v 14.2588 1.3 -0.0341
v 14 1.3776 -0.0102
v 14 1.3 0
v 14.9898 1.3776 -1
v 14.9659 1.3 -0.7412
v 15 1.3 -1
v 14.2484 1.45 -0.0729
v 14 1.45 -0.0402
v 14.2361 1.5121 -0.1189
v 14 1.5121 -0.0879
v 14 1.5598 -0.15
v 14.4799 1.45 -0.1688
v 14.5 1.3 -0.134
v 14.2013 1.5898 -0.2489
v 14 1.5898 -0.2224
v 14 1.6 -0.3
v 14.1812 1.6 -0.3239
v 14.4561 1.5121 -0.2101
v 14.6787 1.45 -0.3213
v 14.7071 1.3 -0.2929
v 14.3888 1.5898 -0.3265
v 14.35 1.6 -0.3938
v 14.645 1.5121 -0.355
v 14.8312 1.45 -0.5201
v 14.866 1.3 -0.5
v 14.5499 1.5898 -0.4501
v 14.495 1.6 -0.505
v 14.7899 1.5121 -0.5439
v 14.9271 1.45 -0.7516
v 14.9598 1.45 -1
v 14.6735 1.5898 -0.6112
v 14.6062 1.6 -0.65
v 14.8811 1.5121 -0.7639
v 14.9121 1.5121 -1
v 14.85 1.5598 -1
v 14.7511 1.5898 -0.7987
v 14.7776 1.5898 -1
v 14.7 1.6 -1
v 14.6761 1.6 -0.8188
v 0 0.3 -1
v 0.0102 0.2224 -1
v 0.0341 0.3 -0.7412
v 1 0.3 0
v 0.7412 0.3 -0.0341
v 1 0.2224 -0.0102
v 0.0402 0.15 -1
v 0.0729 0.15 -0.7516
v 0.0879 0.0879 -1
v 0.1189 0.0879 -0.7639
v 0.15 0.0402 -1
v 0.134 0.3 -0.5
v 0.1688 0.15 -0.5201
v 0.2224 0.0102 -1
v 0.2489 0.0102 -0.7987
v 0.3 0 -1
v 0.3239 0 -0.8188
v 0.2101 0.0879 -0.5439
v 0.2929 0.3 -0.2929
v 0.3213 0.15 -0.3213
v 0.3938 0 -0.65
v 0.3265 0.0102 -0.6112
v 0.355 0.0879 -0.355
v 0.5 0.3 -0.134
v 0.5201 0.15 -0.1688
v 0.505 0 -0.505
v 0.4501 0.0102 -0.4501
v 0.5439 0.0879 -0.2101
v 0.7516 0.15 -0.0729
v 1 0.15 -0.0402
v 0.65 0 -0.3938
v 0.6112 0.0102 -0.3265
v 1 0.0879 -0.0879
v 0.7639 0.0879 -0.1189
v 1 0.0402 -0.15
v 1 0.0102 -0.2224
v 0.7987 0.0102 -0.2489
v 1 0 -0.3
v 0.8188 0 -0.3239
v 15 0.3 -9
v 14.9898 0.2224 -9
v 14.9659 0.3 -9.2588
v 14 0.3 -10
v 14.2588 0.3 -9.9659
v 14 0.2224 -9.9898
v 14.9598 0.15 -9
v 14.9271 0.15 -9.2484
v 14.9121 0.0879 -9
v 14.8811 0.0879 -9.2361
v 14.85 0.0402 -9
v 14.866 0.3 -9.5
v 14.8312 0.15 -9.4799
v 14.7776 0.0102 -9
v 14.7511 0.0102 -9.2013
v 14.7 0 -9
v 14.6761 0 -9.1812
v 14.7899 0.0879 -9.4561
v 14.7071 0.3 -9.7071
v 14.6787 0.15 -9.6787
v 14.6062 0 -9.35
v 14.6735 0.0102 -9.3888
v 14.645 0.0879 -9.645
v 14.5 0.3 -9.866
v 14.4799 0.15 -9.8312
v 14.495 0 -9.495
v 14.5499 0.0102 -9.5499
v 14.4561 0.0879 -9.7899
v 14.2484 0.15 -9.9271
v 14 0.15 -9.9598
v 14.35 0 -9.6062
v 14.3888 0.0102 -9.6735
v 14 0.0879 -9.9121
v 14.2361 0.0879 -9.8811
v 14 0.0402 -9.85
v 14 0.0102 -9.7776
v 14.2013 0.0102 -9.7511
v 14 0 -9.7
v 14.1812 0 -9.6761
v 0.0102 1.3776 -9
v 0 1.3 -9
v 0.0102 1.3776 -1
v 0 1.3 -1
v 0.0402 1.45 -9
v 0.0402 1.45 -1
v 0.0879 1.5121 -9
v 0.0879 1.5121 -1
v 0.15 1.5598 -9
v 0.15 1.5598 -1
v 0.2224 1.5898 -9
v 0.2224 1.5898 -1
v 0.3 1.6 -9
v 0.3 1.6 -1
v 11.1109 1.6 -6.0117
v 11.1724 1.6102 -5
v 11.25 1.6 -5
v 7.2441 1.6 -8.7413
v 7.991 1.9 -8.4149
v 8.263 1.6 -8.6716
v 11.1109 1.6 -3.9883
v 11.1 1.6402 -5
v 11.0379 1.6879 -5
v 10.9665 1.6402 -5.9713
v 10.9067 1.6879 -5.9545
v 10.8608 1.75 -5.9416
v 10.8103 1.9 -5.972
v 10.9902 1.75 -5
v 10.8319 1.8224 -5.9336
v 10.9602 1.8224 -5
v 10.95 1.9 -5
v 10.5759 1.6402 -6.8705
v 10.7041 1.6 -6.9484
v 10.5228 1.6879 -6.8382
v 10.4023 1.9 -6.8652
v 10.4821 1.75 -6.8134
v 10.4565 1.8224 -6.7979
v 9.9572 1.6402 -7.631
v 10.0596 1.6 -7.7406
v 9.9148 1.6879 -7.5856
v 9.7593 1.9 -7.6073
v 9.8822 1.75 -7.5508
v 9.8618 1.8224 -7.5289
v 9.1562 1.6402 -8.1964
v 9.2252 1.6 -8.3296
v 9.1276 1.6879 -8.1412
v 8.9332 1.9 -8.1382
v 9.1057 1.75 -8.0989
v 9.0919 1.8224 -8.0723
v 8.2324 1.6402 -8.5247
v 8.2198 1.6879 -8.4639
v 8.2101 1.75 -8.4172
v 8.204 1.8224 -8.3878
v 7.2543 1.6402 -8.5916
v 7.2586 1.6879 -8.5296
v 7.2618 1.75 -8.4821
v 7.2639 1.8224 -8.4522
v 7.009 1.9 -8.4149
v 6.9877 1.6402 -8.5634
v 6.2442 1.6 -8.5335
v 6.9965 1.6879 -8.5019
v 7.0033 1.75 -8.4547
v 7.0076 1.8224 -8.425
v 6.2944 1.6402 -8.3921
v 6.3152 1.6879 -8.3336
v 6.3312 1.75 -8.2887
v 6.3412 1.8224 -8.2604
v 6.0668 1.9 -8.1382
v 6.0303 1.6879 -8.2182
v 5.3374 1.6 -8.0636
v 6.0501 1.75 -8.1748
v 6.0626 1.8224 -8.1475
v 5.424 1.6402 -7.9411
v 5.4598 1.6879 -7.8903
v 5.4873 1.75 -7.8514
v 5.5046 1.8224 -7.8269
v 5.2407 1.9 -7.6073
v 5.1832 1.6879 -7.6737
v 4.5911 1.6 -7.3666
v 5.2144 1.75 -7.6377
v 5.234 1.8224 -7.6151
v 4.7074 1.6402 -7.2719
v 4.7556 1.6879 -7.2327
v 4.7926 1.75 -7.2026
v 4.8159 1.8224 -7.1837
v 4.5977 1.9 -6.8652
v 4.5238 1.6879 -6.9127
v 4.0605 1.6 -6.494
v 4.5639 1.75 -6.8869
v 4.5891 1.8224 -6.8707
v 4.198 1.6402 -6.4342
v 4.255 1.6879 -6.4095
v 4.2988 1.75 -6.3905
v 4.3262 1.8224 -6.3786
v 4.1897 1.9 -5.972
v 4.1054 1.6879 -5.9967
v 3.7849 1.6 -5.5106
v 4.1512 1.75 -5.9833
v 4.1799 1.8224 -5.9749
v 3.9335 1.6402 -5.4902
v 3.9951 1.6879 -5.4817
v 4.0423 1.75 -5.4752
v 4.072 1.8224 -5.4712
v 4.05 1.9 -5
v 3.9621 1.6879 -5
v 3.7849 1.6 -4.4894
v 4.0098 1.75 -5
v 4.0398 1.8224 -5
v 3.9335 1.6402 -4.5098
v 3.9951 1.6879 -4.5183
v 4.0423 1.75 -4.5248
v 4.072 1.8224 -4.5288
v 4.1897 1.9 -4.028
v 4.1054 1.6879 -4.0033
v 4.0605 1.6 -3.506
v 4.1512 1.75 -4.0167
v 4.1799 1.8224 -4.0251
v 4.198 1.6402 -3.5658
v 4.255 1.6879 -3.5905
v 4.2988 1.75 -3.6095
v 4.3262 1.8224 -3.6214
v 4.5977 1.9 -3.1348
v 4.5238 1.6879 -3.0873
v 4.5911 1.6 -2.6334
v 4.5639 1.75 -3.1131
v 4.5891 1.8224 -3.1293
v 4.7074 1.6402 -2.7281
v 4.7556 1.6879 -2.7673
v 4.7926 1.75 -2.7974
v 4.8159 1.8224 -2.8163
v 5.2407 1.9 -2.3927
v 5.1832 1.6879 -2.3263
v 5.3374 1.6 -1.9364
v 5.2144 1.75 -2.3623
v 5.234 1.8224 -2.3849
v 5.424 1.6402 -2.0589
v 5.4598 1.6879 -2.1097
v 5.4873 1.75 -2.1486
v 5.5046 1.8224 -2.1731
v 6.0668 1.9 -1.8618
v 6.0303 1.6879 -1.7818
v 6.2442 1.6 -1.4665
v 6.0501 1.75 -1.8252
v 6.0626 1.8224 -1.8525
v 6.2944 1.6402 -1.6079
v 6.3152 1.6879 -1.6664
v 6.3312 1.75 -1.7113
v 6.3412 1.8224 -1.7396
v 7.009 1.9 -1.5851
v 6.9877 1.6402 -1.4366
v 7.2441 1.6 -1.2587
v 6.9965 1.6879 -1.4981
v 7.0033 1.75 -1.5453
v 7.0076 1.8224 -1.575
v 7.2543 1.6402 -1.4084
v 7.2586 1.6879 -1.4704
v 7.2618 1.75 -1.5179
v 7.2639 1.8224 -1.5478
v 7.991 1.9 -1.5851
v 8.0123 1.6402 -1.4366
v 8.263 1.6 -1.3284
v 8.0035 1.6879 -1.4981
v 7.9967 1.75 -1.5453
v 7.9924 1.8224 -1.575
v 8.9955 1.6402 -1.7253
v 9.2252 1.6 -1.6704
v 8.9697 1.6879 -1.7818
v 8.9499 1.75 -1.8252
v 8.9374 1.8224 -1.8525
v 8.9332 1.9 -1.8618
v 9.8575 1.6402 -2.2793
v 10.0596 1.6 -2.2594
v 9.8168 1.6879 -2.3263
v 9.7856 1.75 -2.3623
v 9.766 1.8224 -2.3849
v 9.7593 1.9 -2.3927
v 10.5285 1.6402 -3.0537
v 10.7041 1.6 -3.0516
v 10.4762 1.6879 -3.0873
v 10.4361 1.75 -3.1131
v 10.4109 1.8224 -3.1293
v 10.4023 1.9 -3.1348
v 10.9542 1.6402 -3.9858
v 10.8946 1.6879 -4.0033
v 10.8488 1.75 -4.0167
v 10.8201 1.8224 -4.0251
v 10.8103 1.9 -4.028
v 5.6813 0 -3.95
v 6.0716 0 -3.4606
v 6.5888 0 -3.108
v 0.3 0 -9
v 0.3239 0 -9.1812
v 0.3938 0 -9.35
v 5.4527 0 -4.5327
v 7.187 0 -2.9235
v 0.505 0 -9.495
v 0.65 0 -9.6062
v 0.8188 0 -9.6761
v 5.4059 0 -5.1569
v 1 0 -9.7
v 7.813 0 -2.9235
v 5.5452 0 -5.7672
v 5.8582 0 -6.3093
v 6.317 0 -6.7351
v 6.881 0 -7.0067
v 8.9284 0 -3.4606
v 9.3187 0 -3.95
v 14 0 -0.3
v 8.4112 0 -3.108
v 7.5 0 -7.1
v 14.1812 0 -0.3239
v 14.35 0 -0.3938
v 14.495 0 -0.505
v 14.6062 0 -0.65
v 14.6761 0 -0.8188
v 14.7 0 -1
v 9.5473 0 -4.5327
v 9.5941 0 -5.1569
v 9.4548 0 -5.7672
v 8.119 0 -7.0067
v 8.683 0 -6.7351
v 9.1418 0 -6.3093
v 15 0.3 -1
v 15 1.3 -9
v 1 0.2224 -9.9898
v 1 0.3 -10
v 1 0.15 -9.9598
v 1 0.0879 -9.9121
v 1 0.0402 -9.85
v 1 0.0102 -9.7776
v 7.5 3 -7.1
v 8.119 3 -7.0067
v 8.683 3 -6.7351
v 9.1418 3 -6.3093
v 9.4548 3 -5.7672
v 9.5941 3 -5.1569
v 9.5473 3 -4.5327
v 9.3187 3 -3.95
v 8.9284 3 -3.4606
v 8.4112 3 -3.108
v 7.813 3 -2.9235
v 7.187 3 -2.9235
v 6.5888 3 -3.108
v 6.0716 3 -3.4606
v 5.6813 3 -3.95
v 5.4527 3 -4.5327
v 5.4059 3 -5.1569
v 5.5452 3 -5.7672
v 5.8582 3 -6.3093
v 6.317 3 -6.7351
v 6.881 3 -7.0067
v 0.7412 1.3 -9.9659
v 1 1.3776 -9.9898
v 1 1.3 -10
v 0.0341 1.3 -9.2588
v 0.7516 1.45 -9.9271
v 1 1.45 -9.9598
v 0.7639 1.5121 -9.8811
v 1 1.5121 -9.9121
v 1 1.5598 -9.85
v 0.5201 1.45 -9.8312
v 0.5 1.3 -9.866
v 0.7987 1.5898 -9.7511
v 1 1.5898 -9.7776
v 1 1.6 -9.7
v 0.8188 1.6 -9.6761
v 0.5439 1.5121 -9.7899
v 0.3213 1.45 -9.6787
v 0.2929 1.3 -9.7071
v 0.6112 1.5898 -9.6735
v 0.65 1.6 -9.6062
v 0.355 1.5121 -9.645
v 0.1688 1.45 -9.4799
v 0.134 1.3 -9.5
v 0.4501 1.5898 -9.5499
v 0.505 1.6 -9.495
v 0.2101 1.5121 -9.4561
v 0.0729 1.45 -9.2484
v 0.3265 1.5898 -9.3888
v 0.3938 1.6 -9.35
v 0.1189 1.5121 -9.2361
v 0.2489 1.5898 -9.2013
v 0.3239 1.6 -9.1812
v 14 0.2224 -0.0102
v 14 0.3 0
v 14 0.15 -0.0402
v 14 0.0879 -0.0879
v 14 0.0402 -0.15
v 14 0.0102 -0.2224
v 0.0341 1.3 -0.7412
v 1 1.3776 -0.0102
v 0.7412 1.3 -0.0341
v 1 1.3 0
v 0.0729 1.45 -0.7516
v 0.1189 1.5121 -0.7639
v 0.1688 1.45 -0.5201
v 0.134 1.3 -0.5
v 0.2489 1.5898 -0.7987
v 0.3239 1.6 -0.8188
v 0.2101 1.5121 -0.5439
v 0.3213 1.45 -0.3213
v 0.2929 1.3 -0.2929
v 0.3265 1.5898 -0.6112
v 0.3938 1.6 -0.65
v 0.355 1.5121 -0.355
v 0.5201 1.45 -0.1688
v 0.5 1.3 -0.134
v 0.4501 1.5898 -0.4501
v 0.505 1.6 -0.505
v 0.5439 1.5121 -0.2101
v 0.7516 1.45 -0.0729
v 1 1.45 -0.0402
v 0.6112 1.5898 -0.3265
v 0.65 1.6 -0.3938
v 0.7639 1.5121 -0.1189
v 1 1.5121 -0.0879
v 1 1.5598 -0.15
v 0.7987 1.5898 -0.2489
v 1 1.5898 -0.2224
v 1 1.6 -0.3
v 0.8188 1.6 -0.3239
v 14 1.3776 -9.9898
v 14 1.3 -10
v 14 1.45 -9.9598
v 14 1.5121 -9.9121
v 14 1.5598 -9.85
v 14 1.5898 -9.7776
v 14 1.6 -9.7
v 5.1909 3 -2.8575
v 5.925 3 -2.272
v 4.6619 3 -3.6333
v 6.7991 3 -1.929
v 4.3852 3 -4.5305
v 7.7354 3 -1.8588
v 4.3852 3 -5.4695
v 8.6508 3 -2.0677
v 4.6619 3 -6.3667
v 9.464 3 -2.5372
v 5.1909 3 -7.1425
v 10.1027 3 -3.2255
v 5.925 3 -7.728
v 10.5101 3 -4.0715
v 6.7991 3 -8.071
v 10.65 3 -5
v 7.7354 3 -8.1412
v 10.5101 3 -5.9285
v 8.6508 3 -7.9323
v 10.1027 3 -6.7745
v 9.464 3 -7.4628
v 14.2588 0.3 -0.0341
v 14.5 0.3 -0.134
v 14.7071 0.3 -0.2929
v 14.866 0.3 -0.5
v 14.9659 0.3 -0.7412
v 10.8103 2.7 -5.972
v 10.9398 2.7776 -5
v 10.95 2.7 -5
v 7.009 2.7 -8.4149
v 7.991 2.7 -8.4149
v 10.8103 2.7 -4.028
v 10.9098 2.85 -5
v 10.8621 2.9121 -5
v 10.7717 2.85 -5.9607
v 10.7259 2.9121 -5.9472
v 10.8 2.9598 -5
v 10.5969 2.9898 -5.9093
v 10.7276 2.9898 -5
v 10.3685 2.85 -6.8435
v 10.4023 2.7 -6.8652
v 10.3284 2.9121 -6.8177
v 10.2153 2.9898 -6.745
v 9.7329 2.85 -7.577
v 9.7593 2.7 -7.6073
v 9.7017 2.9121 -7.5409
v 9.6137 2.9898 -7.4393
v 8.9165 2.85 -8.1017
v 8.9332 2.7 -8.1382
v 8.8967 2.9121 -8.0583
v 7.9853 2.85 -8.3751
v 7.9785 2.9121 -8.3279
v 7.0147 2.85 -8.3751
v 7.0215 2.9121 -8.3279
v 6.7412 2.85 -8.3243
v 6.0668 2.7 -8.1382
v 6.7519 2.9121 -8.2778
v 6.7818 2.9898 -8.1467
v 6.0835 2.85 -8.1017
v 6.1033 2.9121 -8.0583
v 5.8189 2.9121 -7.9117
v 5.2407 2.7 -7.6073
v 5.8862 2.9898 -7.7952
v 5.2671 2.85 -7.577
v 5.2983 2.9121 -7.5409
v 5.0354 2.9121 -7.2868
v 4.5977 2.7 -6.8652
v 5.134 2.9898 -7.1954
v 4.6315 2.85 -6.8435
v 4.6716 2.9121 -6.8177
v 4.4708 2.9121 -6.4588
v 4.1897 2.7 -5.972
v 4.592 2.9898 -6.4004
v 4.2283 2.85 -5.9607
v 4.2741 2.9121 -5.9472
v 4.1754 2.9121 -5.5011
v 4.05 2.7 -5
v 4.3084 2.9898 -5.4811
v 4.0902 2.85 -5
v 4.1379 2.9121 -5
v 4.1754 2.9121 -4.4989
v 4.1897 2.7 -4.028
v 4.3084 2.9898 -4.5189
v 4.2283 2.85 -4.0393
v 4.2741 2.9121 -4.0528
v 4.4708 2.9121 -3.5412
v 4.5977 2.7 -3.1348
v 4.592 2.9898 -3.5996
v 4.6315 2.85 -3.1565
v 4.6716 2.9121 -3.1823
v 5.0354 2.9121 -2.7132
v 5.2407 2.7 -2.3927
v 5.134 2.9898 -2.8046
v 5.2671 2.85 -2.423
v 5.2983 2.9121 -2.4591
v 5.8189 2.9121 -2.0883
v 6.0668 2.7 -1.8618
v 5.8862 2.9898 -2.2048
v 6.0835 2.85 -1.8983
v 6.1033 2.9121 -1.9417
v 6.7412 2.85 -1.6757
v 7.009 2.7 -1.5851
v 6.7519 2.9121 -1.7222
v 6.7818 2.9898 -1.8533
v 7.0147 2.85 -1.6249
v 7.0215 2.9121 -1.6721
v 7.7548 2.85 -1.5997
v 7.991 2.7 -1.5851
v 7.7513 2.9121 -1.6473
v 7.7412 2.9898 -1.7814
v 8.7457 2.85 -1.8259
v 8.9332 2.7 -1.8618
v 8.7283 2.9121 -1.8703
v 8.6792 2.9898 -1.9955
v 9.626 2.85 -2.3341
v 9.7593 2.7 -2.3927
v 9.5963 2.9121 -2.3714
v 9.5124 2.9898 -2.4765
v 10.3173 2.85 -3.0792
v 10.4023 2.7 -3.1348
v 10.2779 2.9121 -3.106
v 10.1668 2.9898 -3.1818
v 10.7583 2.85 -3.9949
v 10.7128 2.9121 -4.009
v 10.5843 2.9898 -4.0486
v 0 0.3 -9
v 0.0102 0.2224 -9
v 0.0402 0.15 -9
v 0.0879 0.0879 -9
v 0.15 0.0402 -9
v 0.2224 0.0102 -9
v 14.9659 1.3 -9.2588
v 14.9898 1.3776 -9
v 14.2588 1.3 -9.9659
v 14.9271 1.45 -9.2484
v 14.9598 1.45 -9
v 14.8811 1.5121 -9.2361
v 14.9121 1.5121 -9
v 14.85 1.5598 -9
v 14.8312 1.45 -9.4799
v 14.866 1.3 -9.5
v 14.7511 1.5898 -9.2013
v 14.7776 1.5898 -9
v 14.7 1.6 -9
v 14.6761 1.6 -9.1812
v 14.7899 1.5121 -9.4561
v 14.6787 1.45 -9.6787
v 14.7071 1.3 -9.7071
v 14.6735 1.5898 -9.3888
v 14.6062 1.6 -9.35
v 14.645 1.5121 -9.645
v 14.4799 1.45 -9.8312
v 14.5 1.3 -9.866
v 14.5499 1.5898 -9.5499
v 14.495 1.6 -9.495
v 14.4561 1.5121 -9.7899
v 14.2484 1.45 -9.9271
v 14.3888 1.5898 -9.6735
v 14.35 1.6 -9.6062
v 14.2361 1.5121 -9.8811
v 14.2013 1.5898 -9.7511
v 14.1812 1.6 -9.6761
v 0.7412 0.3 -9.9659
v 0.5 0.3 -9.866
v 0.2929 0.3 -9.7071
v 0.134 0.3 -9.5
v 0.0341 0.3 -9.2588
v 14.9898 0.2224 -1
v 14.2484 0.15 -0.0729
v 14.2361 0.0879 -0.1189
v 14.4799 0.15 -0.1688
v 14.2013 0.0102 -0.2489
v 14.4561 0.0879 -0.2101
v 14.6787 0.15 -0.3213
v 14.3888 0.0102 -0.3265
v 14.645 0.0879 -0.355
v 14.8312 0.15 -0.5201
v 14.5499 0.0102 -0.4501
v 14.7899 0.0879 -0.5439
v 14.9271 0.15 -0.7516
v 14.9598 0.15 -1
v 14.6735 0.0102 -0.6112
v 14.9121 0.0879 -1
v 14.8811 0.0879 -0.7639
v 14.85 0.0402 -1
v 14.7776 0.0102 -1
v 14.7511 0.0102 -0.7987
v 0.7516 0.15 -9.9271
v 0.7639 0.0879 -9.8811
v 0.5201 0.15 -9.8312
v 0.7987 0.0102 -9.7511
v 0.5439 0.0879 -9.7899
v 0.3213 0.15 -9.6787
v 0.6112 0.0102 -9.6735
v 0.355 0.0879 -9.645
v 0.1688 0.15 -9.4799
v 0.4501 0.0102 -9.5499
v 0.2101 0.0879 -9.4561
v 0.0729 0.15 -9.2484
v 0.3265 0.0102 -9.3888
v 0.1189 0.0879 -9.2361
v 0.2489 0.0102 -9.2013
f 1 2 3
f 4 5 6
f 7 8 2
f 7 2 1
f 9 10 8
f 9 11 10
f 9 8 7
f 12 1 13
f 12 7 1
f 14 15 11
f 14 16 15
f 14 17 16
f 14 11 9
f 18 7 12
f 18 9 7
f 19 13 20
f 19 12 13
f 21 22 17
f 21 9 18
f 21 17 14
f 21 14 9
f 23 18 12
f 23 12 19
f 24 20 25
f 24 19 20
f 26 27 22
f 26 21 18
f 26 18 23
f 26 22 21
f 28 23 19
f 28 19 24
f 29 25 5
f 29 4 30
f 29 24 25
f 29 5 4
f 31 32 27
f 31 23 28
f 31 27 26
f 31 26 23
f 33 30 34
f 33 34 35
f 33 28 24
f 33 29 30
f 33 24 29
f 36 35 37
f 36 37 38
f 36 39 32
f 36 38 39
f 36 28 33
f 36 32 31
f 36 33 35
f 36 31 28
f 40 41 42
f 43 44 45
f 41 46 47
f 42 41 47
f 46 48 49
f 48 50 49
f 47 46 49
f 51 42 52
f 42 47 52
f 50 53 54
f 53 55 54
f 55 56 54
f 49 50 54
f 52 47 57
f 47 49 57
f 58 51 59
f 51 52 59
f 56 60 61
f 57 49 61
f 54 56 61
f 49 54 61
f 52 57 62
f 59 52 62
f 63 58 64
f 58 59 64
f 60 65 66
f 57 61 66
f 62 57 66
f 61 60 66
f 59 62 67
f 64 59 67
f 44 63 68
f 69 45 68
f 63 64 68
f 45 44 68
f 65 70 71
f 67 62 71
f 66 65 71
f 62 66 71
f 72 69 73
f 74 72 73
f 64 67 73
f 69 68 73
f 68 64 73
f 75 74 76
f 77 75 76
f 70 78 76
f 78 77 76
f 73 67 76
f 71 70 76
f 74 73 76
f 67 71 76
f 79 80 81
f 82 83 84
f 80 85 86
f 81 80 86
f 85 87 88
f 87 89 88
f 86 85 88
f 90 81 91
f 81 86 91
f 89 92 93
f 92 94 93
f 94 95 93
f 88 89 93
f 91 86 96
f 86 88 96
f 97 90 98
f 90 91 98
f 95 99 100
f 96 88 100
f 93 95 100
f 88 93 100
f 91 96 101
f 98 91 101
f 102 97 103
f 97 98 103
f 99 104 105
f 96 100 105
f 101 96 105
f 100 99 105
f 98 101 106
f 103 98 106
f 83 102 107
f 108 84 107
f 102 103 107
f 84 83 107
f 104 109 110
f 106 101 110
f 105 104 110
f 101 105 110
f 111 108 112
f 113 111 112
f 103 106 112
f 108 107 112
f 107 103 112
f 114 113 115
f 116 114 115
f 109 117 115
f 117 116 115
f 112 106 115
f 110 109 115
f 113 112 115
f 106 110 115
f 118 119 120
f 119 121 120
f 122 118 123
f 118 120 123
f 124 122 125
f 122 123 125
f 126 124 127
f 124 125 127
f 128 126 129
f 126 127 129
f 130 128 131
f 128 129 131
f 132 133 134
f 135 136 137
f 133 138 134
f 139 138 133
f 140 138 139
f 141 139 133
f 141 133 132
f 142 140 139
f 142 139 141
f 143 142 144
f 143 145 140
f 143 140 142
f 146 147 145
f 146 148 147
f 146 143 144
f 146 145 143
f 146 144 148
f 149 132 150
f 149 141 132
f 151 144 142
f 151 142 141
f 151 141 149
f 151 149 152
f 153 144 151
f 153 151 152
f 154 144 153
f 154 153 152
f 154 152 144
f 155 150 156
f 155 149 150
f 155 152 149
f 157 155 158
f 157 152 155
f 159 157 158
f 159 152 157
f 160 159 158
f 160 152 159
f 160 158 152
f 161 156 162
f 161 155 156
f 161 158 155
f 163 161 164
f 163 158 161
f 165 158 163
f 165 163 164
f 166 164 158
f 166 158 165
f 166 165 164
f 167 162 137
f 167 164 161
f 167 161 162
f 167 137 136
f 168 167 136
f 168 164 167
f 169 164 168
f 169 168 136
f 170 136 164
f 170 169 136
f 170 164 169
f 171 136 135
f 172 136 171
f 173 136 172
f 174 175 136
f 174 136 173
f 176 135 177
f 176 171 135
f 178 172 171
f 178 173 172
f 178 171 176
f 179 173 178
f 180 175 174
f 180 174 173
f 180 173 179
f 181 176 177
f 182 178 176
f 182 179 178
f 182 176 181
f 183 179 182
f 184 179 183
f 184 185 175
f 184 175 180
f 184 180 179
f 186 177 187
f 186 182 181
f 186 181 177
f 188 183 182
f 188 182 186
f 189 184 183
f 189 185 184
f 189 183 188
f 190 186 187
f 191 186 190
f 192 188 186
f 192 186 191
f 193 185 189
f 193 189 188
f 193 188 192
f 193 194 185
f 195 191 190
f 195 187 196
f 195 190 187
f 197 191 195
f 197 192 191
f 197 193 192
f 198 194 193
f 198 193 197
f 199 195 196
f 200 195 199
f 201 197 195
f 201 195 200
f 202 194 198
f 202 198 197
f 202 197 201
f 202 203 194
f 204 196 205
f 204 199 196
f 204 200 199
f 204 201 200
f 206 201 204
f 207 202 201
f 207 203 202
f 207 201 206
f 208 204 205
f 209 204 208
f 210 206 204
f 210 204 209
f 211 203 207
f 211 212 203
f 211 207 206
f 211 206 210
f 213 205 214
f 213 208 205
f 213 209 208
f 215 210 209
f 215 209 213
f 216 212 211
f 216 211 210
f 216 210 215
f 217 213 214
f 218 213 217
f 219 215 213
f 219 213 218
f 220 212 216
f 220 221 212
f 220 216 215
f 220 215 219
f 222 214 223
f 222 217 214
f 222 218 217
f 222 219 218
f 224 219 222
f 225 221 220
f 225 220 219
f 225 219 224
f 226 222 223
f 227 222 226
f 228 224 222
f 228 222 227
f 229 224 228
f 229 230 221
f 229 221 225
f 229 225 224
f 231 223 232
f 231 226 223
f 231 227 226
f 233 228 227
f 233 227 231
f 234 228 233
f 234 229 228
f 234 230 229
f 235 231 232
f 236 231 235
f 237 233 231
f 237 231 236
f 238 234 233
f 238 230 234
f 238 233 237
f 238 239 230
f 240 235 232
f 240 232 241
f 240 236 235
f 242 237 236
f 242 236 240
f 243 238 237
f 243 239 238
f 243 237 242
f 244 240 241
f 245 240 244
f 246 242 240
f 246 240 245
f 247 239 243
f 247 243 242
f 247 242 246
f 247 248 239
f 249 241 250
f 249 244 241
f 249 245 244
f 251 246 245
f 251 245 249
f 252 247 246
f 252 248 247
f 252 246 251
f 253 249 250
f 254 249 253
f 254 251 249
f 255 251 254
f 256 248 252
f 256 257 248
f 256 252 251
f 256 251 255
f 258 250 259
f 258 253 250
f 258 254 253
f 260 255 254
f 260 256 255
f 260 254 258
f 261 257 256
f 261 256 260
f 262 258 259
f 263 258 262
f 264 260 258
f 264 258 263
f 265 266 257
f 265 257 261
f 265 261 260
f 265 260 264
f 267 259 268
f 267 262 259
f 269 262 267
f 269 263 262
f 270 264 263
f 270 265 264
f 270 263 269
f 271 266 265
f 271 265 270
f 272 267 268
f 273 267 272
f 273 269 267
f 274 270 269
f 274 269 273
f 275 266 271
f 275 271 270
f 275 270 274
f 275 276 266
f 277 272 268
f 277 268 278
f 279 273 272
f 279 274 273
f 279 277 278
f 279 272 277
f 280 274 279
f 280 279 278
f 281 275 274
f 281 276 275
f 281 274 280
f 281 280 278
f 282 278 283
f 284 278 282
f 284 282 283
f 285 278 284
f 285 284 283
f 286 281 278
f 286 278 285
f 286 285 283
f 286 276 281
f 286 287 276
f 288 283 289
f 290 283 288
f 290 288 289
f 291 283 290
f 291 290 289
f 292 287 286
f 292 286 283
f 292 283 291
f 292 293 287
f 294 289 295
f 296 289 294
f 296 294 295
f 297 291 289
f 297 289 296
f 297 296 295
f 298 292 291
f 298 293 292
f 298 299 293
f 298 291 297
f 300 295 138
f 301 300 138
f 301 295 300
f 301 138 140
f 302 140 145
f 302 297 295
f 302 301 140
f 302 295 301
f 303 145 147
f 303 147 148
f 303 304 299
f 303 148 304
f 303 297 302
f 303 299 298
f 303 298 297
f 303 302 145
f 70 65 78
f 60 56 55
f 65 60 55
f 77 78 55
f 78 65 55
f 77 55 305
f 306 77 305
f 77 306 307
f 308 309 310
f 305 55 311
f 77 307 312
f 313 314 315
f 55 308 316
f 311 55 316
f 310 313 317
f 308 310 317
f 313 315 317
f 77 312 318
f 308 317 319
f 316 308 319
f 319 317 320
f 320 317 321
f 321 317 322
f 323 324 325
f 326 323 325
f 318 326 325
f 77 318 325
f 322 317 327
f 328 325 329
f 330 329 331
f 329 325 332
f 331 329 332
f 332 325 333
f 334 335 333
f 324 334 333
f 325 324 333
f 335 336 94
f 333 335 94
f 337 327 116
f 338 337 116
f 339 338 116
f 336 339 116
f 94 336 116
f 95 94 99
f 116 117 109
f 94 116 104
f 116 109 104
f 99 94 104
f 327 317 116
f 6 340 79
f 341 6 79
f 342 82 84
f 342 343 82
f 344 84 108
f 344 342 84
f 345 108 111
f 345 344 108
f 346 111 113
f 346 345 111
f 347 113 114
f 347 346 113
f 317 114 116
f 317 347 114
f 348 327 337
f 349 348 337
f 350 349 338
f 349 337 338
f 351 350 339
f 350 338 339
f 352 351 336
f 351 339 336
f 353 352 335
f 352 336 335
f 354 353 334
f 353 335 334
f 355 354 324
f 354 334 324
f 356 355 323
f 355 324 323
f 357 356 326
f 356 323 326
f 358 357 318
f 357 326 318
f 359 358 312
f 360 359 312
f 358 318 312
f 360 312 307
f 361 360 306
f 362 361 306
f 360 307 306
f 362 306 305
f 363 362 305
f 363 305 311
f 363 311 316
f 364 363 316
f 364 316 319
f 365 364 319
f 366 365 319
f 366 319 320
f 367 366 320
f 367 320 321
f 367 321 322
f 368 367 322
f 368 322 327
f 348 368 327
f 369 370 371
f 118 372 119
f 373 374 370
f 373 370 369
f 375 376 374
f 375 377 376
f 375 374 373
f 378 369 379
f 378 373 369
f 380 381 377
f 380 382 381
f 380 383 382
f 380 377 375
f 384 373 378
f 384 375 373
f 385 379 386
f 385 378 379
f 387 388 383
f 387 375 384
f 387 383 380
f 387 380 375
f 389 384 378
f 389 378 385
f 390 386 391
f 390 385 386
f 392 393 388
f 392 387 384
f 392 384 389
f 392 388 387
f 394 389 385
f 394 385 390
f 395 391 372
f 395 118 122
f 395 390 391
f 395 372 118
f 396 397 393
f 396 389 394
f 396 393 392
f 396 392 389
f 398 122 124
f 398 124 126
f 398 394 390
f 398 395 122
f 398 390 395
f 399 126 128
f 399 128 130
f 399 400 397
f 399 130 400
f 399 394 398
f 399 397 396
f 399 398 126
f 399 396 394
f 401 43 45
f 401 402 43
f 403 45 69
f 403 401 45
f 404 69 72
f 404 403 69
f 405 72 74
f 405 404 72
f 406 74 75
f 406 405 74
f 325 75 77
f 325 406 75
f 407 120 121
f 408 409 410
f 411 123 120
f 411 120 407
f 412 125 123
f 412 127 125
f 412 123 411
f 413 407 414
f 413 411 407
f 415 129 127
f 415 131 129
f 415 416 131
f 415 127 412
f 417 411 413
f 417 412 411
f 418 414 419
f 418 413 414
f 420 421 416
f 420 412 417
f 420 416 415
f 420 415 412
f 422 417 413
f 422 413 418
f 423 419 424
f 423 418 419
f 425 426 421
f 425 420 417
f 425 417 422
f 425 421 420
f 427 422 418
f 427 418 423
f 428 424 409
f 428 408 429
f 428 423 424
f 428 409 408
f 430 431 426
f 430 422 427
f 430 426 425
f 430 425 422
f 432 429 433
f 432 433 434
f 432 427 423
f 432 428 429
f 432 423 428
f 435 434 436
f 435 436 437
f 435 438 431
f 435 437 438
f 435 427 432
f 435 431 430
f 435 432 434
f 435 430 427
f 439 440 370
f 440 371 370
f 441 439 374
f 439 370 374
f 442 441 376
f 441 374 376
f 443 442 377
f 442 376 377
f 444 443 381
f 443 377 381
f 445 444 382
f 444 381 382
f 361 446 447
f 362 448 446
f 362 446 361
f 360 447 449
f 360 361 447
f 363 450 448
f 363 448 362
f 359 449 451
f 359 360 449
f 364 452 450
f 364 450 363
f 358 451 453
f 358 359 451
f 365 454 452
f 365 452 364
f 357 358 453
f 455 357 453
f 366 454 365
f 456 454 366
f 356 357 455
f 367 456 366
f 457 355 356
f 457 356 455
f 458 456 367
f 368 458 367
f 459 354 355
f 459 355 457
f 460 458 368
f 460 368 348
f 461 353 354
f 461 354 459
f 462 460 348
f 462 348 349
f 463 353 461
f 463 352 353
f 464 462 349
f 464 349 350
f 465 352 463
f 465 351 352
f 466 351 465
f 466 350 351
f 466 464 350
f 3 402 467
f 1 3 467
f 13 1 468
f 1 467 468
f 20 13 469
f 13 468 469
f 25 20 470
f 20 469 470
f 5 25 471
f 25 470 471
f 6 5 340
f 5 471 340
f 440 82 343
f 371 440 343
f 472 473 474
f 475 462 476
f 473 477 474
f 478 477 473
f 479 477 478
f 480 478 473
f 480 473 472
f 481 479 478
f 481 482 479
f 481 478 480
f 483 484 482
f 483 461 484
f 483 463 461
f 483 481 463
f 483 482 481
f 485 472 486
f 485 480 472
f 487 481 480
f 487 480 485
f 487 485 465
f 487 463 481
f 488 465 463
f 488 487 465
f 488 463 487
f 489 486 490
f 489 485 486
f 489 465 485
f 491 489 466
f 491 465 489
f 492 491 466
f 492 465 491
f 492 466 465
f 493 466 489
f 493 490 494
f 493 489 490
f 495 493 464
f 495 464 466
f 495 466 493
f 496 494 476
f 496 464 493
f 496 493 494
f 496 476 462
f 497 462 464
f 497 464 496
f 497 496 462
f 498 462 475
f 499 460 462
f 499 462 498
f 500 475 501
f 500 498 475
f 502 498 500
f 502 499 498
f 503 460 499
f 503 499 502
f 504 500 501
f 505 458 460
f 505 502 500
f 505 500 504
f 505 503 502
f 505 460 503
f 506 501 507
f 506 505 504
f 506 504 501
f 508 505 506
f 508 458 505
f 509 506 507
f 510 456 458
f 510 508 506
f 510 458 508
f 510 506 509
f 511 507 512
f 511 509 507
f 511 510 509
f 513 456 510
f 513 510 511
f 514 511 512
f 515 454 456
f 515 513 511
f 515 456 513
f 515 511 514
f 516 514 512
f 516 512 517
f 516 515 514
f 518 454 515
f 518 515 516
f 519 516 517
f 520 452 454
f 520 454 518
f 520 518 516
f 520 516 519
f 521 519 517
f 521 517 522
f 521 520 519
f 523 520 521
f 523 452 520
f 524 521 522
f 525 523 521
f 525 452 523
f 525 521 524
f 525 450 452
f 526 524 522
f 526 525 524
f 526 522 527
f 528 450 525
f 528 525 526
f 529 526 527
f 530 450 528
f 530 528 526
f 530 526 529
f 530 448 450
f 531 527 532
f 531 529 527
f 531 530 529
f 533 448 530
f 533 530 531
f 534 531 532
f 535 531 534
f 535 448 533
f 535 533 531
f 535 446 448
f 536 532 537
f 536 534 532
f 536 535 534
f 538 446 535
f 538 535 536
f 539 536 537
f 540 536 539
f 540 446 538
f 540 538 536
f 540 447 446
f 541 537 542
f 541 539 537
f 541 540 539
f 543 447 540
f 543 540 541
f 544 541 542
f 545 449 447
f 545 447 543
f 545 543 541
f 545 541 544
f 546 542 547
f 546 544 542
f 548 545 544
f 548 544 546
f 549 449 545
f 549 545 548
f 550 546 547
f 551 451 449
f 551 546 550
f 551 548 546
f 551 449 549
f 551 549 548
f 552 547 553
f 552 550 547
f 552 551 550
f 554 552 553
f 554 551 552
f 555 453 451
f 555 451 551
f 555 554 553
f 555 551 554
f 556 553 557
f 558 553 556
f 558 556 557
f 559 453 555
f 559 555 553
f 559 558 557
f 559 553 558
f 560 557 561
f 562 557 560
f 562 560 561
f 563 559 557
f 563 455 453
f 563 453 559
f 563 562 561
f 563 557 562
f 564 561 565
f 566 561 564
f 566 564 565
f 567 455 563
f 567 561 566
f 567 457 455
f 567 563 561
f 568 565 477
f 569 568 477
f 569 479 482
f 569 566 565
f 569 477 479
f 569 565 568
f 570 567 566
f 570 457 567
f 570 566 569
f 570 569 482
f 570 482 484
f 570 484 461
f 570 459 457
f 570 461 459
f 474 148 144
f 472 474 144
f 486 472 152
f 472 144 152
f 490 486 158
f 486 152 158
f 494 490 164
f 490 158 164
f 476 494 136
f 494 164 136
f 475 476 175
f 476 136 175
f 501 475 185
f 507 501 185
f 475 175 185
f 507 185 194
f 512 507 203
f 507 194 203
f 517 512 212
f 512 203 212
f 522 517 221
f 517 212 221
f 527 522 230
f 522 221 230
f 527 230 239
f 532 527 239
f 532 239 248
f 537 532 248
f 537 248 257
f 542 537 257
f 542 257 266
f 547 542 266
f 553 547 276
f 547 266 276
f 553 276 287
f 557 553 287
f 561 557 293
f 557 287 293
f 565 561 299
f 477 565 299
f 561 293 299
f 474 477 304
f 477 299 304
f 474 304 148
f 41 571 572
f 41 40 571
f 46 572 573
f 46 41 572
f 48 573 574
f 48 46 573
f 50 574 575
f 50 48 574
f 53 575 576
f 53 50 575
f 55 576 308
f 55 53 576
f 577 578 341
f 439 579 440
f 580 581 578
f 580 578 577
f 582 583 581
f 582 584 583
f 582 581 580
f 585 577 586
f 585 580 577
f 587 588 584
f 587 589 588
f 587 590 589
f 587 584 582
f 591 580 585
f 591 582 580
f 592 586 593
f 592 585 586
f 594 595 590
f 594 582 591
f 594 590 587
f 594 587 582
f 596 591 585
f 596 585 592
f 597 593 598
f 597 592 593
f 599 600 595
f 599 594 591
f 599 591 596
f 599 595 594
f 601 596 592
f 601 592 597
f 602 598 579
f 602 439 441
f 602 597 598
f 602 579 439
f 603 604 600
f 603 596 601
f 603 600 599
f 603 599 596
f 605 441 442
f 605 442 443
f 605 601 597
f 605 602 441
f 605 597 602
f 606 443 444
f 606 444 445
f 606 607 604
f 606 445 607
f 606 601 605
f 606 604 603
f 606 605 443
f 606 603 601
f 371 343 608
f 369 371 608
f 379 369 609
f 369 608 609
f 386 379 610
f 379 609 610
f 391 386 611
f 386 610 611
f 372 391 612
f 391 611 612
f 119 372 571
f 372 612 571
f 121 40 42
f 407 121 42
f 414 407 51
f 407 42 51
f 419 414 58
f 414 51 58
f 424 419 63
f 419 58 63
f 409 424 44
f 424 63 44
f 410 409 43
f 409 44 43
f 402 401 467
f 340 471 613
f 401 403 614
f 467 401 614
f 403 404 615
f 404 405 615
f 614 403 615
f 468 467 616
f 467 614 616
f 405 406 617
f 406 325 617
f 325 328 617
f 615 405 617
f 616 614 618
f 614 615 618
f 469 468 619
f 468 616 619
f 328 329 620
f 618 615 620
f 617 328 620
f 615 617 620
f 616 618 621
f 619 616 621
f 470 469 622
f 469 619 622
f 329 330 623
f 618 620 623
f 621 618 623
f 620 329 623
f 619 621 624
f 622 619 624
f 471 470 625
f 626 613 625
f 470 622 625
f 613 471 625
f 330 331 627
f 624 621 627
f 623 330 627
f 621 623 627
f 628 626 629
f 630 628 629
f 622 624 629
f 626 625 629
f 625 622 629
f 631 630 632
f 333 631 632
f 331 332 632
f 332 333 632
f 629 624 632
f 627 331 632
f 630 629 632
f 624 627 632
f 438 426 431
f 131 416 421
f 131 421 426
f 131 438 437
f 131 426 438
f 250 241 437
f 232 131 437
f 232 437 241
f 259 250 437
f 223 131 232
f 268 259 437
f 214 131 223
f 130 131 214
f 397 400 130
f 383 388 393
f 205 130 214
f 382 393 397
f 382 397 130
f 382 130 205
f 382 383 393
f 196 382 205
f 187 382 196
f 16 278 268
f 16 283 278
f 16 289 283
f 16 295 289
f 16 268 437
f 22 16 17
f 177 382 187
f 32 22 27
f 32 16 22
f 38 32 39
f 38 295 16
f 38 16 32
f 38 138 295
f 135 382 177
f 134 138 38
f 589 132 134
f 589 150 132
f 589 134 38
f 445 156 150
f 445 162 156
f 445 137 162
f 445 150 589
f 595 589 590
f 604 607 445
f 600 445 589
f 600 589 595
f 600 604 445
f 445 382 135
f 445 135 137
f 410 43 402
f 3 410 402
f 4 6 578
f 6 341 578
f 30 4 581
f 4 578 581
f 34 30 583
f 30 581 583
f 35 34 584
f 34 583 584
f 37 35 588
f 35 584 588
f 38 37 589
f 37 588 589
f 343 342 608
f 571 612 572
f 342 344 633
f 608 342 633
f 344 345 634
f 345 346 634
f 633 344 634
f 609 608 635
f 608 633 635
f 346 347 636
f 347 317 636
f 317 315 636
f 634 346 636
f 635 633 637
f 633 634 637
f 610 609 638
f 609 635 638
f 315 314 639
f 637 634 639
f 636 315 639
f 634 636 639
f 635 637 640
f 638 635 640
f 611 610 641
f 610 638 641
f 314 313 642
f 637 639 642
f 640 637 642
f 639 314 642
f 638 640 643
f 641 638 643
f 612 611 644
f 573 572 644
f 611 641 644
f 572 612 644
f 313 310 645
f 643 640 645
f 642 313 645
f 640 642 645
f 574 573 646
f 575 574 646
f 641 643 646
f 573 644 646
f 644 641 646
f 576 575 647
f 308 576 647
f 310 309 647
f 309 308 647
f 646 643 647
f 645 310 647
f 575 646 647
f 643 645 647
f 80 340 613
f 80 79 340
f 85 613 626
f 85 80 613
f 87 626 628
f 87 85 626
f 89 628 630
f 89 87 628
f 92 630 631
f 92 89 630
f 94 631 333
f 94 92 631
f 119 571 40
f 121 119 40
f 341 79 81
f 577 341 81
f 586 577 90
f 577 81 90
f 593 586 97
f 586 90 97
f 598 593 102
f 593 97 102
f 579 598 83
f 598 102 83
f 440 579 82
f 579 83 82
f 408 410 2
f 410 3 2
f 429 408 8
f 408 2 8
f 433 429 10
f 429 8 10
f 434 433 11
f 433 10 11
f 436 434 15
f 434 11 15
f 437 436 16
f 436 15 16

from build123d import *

# Parameters (mm, degrees)
BOSS_EXTRUDE1_DEPTH         = 1.6
SKETCH2_R                   = 3.45
BOSS_EXTRUDE2_DEPTH         = 1.4
TAP_DRILL_FOR_M5X0_8_TAP1_D = 4.2
FILLET2_R                   = 0.3


with BuildPart() as part:
    # Sketch1 → Boss-Extrude1 (new body)
    with BuildSketch(Plane(origin=(0, 0, 0), x_dir=(1, 0, 0), z_dir=(0, 1, 0))):
        with BuildLine():
            Line((1, 0), (14, 0))
            ThreePointArc((14, 0), (14.707106781, 0.292893219), (15, 1))
            Line((15, 1), (15, 9))
            ThreePointArc((15, 9), (14.707106781, 9.707106781), (14, 10))
            Line((14, 10), (1, 10))
            ThreePointArc((1, 10), (0.292893219, 9.707106781), (0, 9))
            Line((0, 9), (0, 1))
            ThreePointArc((0, 1), (0.292893219, 0.292893219), (1, 0))
        make_face()
    extrude(amount=BOSS_EXTRUDE1_DEPTH)

    # Sketch2 → Boss-Extrude2 (add)
    with BuildSketch(Plane(origin=(0, 1.6, 0), x_dir=(1, 0, 0), z_dir=(0, 1, 0))):
        with Locations((7.5, 5)):
            Circle(SKETCH2_R)
    extrude(amount=BOSS_EXTRUDE2_DEPTH)

    # Tap Drill for M5x0.8 Tap1 (through all)
    with Locations(Plane(origin=(7.5, 3, -5), x_dir=(0, 0, 1), z_dir=(0, 1, 0))):
        with Locations((0, 0)):
            Hole(TAP_DRILL_FOR_M5X0_8_TAP1_D / 2)

    # Fillet2
    fillet2_edges = [part.edges().sort_by_distance(p)[0] for p in [
        (14.707106781, 1.6, -0.292893219),
        (7.5, 0, 0),
        (0.292893219, 0, -0.292893219),
        (15, 1.6, -5),
        (14.707106781, 1.6, -9.707106781),
        (7.5, 1.6, -10),
        (0.292893219, 1.6, -9.707106781),
        (4.05, 1.6, -5),
        (4.05, 3, -5),
        (0, 1.6, -5),
        (0.292893219, 1.6, -0.292893219),
        (7.5, 1.6, 0),
        (0, 0, -5),
        (0.292893219, 0, -9.707106781),
        (7.5, 0, -10),
        (14.707106781, 0, -9.707106781),
        (15, 0, -5),
        (14.707106781, 0, -0.292893219),
    ]]
    fillet(fillet2_edges, radius=FILLET2_R)


solid = part.part
